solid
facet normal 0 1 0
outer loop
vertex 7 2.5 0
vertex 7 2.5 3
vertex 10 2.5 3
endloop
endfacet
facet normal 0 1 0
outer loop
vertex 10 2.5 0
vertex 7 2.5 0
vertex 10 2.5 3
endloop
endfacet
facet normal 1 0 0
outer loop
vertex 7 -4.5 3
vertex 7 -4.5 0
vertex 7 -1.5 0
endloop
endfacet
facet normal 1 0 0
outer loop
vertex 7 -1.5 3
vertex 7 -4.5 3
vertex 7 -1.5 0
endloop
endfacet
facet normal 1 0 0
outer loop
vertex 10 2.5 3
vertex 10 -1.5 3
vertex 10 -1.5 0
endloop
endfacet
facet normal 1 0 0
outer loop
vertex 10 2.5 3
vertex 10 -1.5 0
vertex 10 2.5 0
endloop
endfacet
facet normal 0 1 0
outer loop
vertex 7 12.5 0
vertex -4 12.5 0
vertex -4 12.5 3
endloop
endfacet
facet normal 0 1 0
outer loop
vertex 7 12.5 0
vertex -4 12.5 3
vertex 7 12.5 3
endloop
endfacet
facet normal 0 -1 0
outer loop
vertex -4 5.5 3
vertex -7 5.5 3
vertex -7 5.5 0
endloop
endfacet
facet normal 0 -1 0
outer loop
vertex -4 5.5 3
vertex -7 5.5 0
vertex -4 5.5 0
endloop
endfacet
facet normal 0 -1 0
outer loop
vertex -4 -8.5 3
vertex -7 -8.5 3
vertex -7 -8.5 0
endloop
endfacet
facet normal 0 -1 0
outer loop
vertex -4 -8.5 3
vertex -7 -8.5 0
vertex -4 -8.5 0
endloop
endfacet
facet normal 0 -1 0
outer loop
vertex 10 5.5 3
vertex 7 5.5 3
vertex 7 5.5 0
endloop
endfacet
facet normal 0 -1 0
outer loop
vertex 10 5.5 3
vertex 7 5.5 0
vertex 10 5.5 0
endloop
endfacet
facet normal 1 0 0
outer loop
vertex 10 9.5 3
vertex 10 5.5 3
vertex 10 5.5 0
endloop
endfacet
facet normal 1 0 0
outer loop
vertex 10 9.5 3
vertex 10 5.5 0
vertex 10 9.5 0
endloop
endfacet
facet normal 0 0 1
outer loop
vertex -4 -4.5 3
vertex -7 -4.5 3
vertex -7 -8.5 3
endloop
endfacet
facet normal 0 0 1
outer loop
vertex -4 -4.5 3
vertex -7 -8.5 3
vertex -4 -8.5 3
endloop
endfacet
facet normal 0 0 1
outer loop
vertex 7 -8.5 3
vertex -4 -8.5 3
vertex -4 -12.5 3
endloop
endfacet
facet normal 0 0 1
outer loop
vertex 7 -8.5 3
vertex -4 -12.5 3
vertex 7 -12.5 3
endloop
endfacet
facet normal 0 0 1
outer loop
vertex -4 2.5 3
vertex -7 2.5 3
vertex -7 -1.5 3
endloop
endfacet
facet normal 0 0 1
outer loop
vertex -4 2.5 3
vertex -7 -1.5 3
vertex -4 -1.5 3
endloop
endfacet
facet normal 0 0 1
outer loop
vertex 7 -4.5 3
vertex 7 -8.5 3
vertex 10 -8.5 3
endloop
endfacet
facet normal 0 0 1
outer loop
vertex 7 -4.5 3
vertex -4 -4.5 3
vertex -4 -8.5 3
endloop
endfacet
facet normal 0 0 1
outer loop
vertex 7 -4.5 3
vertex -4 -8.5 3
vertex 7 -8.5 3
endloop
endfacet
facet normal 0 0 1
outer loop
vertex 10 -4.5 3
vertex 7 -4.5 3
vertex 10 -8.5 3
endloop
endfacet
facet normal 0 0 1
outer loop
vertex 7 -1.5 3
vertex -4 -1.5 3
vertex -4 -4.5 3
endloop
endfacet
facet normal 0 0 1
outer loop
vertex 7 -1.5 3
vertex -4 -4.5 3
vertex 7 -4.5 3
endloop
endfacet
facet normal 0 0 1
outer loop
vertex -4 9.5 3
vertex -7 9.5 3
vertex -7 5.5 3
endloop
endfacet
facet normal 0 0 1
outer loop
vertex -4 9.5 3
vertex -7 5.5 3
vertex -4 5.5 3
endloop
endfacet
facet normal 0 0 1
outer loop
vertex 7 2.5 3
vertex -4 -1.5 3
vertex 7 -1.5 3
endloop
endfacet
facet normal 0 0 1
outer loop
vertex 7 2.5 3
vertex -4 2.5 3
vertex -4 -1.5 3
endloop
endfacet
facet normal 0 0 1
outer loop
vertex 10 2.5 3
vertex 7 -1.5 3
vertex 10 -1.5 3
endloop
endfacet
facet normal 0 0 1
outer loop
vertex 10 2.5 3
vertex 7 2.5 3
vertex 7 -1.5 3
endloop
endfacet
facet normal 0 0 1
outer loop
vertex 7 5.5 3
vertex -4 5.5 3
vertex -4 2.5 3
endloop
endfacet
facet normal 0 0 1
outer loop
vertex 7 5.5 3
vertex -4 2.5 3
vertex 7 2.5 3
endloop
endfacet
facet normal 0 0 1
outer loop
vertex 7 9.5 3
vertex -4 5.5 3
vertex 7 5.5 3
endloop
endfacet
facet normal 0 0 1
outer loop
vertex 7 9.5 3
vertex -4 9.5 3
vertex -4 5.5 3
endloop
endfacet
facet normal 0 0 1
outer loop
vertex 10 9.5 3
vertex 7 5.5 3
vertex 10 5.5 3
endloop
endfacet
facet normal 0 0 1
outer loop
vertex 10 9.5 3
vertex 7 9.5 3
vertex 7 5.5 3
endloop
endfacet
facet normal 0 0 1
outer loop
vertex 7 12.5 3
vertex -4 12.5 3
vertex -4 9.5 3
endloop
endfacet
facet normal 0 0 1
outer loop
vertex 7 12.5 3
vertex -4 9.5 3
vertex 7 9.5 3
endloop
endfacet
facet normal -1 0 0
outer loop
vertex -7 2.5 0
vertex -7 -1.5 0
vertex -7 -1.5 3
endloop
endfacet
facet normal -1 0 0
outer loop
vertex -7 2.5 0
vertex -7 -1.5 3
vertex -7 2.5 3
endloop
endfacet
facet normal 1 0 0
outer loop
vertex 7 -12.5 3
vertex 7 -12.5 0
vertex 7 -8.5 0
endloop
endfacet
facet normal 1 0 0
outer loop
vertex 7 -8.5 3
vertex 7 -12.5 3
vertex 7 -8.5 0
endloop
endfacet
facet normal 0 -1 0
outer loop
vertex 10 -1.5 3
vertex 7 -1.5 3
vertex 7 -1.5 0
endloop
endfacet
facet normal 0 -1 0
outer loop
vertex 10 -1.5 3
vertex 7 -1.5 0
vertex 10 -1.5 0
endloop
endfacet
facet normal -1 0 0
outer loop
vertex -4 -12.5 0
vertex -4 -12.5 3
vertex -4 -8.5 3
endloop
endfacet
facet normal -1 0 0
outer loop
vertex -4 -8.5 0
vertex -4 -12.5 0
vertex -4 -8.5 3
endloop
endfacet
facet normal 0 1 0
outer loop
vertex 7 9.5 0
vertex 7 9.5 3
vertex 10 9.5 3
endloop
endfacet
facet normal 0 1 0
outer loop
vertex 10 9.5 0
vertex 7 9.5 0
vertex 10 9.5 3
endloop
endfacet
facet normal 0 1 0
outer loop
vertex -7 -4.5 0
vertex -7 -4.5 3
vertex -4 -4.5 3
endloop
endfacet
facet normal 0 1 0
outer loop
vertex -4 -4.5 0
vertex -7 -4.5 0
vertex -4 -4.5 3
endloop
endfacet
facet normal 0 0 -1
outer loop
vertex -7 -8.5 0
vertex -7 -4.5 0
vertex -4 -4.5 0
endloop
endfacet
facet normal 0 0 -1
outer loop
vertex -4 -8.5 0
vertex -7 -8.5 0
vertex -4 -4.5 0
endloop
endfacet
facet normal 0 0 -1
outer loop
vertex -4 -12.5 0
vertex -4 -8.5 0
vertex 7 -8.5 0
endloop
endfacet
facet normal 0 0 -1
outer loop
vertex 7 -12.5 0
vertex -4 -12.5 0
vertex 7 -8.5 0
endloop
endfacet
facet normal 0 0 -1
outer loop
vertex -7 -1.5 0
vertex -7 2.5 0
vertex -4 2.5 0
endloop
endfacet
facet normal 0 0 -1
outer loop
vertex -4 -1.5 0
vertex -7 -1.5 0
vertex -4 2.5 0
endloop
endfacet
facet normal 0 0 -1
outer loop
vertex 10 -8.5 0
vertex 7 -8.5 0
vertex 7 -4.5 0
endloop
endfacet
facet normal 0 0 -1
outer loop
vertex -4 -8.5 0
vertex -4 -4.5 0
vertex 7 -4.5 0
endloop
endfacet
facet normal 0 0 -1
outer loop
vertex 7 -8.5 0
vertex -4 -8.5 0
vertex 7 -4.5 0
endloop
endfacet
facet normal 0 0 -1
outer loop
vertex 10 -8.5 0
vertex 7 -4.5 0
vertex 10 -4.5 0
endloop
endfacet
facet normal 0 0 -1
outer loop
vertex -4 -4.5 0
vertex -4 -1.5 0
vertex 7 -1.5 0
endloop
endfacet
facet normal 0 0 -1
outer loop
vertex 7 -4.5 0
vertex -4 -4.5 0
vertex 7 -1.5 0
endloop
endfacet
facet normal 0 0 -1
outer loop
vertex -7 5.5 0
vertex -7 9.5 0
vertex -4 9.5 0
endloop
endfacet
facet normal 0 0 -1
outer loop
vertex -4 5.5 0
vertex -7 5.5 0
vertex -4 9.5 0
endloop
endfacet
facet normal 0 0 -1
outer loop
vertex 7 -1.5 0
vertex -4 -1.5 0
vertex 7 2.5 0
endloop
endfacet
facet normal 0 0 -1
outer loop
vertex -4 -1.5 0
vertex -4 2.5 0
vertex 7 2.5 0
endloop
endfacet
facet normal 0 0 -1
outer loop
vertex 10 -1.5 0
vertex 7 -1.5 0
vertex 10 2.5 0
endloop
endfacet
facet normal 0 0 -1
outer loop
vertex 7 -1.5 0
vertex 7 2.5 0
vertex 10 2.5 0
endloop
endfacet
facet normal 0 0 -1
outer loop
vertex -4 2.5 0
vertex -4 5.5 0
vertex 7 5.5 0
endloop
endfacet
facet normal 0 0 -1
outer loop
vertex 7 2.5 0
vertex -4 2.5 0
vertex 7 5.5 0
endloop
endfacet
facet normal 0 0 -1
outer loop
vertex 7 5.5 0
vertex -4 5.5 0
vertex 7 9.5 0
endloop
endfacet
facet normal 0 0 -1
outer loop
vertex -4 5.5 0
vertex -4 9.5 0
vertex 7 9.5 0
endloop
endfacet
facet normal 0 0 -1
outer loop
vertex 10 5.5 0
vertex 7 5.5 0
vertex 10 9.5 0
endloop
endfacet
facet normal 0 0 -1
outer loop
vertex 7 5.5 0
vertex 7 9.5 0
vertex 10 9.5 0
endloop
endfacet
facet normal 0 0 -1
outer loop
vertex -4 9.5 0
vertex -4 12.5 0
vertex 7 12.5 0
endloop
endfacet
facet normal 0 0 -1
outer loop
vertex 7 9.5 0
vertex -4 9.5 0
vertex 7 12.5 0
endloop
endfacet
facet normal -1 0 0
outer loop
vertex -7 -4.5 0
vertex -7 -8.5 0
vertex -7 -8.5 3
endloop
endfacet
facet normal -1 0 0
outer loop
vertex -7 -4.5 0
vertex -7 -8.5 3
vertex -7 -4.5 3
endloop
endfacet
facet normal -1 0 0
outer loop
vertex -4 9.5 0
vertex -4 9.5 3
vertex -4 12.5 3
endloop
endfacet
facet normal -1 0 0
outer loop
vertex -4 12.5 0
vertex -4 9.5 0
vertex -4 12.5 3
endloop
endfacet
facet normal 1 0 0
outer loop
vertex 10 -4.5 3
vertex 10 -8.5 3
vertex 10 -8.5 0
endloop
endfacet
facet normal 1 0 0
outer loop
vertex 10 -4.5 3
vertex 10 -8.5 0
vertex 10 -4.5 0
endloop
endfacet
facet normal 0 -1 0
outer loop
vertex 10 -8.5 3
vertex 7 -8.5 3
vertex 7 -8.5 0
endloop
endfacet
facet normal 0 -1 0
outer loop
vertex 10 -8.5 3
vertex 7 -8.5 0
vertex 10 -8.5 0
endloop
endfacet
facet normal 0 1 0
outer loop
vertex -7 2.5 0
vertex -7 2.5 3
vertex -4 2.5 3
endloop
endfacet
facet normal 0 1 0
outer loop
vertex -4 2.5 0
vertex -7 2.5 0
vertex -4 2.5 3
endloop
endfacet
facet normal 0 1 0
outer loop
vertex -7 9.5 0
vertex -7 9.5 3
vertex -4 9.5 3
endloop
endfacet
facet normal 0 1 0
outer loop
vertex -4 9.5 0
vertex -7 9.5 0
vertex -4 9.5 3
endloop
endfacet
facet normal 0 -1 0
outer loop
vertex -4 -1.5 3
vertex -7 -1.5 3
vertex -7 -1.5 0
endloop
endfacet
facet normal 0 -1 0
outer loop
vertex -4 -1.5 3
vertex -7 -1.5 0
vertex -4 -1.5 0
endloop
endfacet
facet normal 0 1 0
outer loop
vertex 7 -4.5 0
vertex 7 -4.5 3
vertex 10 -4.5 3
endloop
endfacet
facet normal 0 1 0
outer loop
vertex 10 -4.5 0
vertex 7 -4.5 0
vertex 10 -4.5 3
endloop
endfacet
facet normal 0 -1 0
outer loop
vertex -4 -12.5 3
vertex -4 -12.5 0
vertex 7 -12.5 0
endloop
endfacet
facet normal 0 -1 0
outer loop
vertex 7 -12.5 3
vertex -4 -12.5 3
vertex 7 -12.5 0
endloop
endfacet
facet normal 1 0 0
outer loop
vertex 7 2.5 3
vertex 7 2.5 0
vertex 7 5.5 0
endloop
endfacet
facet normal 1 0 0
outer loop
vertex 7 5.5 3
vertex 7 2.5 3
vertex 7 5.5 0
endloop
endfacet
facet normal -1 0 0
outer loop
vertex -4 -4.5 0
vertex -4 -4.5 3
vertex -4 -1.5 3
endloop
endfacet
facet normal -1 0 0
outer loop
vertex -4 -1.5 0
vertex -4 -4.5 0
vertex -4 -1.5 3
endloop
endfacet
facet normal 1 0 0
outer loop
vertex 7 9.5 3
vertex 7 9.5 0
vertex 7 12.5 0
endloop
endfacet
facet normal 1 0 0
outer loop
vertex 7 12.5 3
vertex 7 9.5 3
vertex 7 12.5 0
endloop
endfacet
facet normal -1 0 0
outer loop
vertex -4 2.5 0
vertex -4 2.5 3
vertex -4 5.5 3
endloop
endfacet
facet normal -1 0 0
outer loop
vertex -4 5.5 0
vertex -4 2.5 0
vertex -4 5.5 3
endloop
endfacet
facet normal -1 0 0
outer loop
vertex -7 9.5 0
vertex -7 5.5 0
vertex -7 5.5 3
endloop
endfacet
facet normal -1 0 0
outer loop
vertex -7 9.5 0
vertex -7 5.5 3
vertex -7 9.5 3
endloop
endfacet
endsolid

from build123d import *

# Parameters (mm, degrees)
SKETCH1_W           = 14
SKETCH1_H           = 25
BOSS_EXTRUDE1_DEPTH = 3
SKETCH3_W           = 3
SKETCH3_H           = 3
SKETCH3_H_2         = 4
CUT_EXTRUDE2_DEPTH  = 3
SKETCH4_W           = 3
SKETCH4_H           = 4
BOSS_EXTRUDE2_DEPTH = 3


with BuildPart() as part:
    # Sketch1 → Boss-Extrude1 (new body)
    with BuildSketch(Plane.XY):
        Rectangle(SKETCH1_W, SKETCH1_H)
    extrude(amount=BOSS_EXTRUDE1_DEPTH)

    # Sketch3 → Cut-Extrude2 (cut)
    with BuildSketch(Plane.XY.offset(3)):
        with Locations((-5.5, 11)):
            Rectangle(SKETCH3_W, SKETCH3_H)
        with Locations((-5.5, 4)):
            Rectangle(SKETCH3_W, SKETCH3_H)
        with Locations((-5.5, -3)):
            Rectangle(SKETCH3_W, SKETCH3_H)
        with Locations((-5.5, -10.5)):
            Rectangle(SKETCH3_W, SKETCH3_H_2)
    extrude(amount=-CUT_EXTRUDE2_DEPTH, mode=Mode.SUBTRACT)

    # Sketch4 → Boss-Extrude2 (add)
    with BuildSketch(Plane.XY.offset(3)):
        with Locations((8.5, 7.5)):
            Rectangle(SKETCH4_W, SKETCH4_H)
        with Locations((8.5, 0.5)):
            Rectangle(SKETCH4_W, SKETCH4_H)
        with Locations((8.5, -6.5)):
            Rectangle(SKETCH4_W, SKETCH4_H)
    extrude(amount=-BOSS_EXTRUDE2_DEPTH)


solid = part.part
